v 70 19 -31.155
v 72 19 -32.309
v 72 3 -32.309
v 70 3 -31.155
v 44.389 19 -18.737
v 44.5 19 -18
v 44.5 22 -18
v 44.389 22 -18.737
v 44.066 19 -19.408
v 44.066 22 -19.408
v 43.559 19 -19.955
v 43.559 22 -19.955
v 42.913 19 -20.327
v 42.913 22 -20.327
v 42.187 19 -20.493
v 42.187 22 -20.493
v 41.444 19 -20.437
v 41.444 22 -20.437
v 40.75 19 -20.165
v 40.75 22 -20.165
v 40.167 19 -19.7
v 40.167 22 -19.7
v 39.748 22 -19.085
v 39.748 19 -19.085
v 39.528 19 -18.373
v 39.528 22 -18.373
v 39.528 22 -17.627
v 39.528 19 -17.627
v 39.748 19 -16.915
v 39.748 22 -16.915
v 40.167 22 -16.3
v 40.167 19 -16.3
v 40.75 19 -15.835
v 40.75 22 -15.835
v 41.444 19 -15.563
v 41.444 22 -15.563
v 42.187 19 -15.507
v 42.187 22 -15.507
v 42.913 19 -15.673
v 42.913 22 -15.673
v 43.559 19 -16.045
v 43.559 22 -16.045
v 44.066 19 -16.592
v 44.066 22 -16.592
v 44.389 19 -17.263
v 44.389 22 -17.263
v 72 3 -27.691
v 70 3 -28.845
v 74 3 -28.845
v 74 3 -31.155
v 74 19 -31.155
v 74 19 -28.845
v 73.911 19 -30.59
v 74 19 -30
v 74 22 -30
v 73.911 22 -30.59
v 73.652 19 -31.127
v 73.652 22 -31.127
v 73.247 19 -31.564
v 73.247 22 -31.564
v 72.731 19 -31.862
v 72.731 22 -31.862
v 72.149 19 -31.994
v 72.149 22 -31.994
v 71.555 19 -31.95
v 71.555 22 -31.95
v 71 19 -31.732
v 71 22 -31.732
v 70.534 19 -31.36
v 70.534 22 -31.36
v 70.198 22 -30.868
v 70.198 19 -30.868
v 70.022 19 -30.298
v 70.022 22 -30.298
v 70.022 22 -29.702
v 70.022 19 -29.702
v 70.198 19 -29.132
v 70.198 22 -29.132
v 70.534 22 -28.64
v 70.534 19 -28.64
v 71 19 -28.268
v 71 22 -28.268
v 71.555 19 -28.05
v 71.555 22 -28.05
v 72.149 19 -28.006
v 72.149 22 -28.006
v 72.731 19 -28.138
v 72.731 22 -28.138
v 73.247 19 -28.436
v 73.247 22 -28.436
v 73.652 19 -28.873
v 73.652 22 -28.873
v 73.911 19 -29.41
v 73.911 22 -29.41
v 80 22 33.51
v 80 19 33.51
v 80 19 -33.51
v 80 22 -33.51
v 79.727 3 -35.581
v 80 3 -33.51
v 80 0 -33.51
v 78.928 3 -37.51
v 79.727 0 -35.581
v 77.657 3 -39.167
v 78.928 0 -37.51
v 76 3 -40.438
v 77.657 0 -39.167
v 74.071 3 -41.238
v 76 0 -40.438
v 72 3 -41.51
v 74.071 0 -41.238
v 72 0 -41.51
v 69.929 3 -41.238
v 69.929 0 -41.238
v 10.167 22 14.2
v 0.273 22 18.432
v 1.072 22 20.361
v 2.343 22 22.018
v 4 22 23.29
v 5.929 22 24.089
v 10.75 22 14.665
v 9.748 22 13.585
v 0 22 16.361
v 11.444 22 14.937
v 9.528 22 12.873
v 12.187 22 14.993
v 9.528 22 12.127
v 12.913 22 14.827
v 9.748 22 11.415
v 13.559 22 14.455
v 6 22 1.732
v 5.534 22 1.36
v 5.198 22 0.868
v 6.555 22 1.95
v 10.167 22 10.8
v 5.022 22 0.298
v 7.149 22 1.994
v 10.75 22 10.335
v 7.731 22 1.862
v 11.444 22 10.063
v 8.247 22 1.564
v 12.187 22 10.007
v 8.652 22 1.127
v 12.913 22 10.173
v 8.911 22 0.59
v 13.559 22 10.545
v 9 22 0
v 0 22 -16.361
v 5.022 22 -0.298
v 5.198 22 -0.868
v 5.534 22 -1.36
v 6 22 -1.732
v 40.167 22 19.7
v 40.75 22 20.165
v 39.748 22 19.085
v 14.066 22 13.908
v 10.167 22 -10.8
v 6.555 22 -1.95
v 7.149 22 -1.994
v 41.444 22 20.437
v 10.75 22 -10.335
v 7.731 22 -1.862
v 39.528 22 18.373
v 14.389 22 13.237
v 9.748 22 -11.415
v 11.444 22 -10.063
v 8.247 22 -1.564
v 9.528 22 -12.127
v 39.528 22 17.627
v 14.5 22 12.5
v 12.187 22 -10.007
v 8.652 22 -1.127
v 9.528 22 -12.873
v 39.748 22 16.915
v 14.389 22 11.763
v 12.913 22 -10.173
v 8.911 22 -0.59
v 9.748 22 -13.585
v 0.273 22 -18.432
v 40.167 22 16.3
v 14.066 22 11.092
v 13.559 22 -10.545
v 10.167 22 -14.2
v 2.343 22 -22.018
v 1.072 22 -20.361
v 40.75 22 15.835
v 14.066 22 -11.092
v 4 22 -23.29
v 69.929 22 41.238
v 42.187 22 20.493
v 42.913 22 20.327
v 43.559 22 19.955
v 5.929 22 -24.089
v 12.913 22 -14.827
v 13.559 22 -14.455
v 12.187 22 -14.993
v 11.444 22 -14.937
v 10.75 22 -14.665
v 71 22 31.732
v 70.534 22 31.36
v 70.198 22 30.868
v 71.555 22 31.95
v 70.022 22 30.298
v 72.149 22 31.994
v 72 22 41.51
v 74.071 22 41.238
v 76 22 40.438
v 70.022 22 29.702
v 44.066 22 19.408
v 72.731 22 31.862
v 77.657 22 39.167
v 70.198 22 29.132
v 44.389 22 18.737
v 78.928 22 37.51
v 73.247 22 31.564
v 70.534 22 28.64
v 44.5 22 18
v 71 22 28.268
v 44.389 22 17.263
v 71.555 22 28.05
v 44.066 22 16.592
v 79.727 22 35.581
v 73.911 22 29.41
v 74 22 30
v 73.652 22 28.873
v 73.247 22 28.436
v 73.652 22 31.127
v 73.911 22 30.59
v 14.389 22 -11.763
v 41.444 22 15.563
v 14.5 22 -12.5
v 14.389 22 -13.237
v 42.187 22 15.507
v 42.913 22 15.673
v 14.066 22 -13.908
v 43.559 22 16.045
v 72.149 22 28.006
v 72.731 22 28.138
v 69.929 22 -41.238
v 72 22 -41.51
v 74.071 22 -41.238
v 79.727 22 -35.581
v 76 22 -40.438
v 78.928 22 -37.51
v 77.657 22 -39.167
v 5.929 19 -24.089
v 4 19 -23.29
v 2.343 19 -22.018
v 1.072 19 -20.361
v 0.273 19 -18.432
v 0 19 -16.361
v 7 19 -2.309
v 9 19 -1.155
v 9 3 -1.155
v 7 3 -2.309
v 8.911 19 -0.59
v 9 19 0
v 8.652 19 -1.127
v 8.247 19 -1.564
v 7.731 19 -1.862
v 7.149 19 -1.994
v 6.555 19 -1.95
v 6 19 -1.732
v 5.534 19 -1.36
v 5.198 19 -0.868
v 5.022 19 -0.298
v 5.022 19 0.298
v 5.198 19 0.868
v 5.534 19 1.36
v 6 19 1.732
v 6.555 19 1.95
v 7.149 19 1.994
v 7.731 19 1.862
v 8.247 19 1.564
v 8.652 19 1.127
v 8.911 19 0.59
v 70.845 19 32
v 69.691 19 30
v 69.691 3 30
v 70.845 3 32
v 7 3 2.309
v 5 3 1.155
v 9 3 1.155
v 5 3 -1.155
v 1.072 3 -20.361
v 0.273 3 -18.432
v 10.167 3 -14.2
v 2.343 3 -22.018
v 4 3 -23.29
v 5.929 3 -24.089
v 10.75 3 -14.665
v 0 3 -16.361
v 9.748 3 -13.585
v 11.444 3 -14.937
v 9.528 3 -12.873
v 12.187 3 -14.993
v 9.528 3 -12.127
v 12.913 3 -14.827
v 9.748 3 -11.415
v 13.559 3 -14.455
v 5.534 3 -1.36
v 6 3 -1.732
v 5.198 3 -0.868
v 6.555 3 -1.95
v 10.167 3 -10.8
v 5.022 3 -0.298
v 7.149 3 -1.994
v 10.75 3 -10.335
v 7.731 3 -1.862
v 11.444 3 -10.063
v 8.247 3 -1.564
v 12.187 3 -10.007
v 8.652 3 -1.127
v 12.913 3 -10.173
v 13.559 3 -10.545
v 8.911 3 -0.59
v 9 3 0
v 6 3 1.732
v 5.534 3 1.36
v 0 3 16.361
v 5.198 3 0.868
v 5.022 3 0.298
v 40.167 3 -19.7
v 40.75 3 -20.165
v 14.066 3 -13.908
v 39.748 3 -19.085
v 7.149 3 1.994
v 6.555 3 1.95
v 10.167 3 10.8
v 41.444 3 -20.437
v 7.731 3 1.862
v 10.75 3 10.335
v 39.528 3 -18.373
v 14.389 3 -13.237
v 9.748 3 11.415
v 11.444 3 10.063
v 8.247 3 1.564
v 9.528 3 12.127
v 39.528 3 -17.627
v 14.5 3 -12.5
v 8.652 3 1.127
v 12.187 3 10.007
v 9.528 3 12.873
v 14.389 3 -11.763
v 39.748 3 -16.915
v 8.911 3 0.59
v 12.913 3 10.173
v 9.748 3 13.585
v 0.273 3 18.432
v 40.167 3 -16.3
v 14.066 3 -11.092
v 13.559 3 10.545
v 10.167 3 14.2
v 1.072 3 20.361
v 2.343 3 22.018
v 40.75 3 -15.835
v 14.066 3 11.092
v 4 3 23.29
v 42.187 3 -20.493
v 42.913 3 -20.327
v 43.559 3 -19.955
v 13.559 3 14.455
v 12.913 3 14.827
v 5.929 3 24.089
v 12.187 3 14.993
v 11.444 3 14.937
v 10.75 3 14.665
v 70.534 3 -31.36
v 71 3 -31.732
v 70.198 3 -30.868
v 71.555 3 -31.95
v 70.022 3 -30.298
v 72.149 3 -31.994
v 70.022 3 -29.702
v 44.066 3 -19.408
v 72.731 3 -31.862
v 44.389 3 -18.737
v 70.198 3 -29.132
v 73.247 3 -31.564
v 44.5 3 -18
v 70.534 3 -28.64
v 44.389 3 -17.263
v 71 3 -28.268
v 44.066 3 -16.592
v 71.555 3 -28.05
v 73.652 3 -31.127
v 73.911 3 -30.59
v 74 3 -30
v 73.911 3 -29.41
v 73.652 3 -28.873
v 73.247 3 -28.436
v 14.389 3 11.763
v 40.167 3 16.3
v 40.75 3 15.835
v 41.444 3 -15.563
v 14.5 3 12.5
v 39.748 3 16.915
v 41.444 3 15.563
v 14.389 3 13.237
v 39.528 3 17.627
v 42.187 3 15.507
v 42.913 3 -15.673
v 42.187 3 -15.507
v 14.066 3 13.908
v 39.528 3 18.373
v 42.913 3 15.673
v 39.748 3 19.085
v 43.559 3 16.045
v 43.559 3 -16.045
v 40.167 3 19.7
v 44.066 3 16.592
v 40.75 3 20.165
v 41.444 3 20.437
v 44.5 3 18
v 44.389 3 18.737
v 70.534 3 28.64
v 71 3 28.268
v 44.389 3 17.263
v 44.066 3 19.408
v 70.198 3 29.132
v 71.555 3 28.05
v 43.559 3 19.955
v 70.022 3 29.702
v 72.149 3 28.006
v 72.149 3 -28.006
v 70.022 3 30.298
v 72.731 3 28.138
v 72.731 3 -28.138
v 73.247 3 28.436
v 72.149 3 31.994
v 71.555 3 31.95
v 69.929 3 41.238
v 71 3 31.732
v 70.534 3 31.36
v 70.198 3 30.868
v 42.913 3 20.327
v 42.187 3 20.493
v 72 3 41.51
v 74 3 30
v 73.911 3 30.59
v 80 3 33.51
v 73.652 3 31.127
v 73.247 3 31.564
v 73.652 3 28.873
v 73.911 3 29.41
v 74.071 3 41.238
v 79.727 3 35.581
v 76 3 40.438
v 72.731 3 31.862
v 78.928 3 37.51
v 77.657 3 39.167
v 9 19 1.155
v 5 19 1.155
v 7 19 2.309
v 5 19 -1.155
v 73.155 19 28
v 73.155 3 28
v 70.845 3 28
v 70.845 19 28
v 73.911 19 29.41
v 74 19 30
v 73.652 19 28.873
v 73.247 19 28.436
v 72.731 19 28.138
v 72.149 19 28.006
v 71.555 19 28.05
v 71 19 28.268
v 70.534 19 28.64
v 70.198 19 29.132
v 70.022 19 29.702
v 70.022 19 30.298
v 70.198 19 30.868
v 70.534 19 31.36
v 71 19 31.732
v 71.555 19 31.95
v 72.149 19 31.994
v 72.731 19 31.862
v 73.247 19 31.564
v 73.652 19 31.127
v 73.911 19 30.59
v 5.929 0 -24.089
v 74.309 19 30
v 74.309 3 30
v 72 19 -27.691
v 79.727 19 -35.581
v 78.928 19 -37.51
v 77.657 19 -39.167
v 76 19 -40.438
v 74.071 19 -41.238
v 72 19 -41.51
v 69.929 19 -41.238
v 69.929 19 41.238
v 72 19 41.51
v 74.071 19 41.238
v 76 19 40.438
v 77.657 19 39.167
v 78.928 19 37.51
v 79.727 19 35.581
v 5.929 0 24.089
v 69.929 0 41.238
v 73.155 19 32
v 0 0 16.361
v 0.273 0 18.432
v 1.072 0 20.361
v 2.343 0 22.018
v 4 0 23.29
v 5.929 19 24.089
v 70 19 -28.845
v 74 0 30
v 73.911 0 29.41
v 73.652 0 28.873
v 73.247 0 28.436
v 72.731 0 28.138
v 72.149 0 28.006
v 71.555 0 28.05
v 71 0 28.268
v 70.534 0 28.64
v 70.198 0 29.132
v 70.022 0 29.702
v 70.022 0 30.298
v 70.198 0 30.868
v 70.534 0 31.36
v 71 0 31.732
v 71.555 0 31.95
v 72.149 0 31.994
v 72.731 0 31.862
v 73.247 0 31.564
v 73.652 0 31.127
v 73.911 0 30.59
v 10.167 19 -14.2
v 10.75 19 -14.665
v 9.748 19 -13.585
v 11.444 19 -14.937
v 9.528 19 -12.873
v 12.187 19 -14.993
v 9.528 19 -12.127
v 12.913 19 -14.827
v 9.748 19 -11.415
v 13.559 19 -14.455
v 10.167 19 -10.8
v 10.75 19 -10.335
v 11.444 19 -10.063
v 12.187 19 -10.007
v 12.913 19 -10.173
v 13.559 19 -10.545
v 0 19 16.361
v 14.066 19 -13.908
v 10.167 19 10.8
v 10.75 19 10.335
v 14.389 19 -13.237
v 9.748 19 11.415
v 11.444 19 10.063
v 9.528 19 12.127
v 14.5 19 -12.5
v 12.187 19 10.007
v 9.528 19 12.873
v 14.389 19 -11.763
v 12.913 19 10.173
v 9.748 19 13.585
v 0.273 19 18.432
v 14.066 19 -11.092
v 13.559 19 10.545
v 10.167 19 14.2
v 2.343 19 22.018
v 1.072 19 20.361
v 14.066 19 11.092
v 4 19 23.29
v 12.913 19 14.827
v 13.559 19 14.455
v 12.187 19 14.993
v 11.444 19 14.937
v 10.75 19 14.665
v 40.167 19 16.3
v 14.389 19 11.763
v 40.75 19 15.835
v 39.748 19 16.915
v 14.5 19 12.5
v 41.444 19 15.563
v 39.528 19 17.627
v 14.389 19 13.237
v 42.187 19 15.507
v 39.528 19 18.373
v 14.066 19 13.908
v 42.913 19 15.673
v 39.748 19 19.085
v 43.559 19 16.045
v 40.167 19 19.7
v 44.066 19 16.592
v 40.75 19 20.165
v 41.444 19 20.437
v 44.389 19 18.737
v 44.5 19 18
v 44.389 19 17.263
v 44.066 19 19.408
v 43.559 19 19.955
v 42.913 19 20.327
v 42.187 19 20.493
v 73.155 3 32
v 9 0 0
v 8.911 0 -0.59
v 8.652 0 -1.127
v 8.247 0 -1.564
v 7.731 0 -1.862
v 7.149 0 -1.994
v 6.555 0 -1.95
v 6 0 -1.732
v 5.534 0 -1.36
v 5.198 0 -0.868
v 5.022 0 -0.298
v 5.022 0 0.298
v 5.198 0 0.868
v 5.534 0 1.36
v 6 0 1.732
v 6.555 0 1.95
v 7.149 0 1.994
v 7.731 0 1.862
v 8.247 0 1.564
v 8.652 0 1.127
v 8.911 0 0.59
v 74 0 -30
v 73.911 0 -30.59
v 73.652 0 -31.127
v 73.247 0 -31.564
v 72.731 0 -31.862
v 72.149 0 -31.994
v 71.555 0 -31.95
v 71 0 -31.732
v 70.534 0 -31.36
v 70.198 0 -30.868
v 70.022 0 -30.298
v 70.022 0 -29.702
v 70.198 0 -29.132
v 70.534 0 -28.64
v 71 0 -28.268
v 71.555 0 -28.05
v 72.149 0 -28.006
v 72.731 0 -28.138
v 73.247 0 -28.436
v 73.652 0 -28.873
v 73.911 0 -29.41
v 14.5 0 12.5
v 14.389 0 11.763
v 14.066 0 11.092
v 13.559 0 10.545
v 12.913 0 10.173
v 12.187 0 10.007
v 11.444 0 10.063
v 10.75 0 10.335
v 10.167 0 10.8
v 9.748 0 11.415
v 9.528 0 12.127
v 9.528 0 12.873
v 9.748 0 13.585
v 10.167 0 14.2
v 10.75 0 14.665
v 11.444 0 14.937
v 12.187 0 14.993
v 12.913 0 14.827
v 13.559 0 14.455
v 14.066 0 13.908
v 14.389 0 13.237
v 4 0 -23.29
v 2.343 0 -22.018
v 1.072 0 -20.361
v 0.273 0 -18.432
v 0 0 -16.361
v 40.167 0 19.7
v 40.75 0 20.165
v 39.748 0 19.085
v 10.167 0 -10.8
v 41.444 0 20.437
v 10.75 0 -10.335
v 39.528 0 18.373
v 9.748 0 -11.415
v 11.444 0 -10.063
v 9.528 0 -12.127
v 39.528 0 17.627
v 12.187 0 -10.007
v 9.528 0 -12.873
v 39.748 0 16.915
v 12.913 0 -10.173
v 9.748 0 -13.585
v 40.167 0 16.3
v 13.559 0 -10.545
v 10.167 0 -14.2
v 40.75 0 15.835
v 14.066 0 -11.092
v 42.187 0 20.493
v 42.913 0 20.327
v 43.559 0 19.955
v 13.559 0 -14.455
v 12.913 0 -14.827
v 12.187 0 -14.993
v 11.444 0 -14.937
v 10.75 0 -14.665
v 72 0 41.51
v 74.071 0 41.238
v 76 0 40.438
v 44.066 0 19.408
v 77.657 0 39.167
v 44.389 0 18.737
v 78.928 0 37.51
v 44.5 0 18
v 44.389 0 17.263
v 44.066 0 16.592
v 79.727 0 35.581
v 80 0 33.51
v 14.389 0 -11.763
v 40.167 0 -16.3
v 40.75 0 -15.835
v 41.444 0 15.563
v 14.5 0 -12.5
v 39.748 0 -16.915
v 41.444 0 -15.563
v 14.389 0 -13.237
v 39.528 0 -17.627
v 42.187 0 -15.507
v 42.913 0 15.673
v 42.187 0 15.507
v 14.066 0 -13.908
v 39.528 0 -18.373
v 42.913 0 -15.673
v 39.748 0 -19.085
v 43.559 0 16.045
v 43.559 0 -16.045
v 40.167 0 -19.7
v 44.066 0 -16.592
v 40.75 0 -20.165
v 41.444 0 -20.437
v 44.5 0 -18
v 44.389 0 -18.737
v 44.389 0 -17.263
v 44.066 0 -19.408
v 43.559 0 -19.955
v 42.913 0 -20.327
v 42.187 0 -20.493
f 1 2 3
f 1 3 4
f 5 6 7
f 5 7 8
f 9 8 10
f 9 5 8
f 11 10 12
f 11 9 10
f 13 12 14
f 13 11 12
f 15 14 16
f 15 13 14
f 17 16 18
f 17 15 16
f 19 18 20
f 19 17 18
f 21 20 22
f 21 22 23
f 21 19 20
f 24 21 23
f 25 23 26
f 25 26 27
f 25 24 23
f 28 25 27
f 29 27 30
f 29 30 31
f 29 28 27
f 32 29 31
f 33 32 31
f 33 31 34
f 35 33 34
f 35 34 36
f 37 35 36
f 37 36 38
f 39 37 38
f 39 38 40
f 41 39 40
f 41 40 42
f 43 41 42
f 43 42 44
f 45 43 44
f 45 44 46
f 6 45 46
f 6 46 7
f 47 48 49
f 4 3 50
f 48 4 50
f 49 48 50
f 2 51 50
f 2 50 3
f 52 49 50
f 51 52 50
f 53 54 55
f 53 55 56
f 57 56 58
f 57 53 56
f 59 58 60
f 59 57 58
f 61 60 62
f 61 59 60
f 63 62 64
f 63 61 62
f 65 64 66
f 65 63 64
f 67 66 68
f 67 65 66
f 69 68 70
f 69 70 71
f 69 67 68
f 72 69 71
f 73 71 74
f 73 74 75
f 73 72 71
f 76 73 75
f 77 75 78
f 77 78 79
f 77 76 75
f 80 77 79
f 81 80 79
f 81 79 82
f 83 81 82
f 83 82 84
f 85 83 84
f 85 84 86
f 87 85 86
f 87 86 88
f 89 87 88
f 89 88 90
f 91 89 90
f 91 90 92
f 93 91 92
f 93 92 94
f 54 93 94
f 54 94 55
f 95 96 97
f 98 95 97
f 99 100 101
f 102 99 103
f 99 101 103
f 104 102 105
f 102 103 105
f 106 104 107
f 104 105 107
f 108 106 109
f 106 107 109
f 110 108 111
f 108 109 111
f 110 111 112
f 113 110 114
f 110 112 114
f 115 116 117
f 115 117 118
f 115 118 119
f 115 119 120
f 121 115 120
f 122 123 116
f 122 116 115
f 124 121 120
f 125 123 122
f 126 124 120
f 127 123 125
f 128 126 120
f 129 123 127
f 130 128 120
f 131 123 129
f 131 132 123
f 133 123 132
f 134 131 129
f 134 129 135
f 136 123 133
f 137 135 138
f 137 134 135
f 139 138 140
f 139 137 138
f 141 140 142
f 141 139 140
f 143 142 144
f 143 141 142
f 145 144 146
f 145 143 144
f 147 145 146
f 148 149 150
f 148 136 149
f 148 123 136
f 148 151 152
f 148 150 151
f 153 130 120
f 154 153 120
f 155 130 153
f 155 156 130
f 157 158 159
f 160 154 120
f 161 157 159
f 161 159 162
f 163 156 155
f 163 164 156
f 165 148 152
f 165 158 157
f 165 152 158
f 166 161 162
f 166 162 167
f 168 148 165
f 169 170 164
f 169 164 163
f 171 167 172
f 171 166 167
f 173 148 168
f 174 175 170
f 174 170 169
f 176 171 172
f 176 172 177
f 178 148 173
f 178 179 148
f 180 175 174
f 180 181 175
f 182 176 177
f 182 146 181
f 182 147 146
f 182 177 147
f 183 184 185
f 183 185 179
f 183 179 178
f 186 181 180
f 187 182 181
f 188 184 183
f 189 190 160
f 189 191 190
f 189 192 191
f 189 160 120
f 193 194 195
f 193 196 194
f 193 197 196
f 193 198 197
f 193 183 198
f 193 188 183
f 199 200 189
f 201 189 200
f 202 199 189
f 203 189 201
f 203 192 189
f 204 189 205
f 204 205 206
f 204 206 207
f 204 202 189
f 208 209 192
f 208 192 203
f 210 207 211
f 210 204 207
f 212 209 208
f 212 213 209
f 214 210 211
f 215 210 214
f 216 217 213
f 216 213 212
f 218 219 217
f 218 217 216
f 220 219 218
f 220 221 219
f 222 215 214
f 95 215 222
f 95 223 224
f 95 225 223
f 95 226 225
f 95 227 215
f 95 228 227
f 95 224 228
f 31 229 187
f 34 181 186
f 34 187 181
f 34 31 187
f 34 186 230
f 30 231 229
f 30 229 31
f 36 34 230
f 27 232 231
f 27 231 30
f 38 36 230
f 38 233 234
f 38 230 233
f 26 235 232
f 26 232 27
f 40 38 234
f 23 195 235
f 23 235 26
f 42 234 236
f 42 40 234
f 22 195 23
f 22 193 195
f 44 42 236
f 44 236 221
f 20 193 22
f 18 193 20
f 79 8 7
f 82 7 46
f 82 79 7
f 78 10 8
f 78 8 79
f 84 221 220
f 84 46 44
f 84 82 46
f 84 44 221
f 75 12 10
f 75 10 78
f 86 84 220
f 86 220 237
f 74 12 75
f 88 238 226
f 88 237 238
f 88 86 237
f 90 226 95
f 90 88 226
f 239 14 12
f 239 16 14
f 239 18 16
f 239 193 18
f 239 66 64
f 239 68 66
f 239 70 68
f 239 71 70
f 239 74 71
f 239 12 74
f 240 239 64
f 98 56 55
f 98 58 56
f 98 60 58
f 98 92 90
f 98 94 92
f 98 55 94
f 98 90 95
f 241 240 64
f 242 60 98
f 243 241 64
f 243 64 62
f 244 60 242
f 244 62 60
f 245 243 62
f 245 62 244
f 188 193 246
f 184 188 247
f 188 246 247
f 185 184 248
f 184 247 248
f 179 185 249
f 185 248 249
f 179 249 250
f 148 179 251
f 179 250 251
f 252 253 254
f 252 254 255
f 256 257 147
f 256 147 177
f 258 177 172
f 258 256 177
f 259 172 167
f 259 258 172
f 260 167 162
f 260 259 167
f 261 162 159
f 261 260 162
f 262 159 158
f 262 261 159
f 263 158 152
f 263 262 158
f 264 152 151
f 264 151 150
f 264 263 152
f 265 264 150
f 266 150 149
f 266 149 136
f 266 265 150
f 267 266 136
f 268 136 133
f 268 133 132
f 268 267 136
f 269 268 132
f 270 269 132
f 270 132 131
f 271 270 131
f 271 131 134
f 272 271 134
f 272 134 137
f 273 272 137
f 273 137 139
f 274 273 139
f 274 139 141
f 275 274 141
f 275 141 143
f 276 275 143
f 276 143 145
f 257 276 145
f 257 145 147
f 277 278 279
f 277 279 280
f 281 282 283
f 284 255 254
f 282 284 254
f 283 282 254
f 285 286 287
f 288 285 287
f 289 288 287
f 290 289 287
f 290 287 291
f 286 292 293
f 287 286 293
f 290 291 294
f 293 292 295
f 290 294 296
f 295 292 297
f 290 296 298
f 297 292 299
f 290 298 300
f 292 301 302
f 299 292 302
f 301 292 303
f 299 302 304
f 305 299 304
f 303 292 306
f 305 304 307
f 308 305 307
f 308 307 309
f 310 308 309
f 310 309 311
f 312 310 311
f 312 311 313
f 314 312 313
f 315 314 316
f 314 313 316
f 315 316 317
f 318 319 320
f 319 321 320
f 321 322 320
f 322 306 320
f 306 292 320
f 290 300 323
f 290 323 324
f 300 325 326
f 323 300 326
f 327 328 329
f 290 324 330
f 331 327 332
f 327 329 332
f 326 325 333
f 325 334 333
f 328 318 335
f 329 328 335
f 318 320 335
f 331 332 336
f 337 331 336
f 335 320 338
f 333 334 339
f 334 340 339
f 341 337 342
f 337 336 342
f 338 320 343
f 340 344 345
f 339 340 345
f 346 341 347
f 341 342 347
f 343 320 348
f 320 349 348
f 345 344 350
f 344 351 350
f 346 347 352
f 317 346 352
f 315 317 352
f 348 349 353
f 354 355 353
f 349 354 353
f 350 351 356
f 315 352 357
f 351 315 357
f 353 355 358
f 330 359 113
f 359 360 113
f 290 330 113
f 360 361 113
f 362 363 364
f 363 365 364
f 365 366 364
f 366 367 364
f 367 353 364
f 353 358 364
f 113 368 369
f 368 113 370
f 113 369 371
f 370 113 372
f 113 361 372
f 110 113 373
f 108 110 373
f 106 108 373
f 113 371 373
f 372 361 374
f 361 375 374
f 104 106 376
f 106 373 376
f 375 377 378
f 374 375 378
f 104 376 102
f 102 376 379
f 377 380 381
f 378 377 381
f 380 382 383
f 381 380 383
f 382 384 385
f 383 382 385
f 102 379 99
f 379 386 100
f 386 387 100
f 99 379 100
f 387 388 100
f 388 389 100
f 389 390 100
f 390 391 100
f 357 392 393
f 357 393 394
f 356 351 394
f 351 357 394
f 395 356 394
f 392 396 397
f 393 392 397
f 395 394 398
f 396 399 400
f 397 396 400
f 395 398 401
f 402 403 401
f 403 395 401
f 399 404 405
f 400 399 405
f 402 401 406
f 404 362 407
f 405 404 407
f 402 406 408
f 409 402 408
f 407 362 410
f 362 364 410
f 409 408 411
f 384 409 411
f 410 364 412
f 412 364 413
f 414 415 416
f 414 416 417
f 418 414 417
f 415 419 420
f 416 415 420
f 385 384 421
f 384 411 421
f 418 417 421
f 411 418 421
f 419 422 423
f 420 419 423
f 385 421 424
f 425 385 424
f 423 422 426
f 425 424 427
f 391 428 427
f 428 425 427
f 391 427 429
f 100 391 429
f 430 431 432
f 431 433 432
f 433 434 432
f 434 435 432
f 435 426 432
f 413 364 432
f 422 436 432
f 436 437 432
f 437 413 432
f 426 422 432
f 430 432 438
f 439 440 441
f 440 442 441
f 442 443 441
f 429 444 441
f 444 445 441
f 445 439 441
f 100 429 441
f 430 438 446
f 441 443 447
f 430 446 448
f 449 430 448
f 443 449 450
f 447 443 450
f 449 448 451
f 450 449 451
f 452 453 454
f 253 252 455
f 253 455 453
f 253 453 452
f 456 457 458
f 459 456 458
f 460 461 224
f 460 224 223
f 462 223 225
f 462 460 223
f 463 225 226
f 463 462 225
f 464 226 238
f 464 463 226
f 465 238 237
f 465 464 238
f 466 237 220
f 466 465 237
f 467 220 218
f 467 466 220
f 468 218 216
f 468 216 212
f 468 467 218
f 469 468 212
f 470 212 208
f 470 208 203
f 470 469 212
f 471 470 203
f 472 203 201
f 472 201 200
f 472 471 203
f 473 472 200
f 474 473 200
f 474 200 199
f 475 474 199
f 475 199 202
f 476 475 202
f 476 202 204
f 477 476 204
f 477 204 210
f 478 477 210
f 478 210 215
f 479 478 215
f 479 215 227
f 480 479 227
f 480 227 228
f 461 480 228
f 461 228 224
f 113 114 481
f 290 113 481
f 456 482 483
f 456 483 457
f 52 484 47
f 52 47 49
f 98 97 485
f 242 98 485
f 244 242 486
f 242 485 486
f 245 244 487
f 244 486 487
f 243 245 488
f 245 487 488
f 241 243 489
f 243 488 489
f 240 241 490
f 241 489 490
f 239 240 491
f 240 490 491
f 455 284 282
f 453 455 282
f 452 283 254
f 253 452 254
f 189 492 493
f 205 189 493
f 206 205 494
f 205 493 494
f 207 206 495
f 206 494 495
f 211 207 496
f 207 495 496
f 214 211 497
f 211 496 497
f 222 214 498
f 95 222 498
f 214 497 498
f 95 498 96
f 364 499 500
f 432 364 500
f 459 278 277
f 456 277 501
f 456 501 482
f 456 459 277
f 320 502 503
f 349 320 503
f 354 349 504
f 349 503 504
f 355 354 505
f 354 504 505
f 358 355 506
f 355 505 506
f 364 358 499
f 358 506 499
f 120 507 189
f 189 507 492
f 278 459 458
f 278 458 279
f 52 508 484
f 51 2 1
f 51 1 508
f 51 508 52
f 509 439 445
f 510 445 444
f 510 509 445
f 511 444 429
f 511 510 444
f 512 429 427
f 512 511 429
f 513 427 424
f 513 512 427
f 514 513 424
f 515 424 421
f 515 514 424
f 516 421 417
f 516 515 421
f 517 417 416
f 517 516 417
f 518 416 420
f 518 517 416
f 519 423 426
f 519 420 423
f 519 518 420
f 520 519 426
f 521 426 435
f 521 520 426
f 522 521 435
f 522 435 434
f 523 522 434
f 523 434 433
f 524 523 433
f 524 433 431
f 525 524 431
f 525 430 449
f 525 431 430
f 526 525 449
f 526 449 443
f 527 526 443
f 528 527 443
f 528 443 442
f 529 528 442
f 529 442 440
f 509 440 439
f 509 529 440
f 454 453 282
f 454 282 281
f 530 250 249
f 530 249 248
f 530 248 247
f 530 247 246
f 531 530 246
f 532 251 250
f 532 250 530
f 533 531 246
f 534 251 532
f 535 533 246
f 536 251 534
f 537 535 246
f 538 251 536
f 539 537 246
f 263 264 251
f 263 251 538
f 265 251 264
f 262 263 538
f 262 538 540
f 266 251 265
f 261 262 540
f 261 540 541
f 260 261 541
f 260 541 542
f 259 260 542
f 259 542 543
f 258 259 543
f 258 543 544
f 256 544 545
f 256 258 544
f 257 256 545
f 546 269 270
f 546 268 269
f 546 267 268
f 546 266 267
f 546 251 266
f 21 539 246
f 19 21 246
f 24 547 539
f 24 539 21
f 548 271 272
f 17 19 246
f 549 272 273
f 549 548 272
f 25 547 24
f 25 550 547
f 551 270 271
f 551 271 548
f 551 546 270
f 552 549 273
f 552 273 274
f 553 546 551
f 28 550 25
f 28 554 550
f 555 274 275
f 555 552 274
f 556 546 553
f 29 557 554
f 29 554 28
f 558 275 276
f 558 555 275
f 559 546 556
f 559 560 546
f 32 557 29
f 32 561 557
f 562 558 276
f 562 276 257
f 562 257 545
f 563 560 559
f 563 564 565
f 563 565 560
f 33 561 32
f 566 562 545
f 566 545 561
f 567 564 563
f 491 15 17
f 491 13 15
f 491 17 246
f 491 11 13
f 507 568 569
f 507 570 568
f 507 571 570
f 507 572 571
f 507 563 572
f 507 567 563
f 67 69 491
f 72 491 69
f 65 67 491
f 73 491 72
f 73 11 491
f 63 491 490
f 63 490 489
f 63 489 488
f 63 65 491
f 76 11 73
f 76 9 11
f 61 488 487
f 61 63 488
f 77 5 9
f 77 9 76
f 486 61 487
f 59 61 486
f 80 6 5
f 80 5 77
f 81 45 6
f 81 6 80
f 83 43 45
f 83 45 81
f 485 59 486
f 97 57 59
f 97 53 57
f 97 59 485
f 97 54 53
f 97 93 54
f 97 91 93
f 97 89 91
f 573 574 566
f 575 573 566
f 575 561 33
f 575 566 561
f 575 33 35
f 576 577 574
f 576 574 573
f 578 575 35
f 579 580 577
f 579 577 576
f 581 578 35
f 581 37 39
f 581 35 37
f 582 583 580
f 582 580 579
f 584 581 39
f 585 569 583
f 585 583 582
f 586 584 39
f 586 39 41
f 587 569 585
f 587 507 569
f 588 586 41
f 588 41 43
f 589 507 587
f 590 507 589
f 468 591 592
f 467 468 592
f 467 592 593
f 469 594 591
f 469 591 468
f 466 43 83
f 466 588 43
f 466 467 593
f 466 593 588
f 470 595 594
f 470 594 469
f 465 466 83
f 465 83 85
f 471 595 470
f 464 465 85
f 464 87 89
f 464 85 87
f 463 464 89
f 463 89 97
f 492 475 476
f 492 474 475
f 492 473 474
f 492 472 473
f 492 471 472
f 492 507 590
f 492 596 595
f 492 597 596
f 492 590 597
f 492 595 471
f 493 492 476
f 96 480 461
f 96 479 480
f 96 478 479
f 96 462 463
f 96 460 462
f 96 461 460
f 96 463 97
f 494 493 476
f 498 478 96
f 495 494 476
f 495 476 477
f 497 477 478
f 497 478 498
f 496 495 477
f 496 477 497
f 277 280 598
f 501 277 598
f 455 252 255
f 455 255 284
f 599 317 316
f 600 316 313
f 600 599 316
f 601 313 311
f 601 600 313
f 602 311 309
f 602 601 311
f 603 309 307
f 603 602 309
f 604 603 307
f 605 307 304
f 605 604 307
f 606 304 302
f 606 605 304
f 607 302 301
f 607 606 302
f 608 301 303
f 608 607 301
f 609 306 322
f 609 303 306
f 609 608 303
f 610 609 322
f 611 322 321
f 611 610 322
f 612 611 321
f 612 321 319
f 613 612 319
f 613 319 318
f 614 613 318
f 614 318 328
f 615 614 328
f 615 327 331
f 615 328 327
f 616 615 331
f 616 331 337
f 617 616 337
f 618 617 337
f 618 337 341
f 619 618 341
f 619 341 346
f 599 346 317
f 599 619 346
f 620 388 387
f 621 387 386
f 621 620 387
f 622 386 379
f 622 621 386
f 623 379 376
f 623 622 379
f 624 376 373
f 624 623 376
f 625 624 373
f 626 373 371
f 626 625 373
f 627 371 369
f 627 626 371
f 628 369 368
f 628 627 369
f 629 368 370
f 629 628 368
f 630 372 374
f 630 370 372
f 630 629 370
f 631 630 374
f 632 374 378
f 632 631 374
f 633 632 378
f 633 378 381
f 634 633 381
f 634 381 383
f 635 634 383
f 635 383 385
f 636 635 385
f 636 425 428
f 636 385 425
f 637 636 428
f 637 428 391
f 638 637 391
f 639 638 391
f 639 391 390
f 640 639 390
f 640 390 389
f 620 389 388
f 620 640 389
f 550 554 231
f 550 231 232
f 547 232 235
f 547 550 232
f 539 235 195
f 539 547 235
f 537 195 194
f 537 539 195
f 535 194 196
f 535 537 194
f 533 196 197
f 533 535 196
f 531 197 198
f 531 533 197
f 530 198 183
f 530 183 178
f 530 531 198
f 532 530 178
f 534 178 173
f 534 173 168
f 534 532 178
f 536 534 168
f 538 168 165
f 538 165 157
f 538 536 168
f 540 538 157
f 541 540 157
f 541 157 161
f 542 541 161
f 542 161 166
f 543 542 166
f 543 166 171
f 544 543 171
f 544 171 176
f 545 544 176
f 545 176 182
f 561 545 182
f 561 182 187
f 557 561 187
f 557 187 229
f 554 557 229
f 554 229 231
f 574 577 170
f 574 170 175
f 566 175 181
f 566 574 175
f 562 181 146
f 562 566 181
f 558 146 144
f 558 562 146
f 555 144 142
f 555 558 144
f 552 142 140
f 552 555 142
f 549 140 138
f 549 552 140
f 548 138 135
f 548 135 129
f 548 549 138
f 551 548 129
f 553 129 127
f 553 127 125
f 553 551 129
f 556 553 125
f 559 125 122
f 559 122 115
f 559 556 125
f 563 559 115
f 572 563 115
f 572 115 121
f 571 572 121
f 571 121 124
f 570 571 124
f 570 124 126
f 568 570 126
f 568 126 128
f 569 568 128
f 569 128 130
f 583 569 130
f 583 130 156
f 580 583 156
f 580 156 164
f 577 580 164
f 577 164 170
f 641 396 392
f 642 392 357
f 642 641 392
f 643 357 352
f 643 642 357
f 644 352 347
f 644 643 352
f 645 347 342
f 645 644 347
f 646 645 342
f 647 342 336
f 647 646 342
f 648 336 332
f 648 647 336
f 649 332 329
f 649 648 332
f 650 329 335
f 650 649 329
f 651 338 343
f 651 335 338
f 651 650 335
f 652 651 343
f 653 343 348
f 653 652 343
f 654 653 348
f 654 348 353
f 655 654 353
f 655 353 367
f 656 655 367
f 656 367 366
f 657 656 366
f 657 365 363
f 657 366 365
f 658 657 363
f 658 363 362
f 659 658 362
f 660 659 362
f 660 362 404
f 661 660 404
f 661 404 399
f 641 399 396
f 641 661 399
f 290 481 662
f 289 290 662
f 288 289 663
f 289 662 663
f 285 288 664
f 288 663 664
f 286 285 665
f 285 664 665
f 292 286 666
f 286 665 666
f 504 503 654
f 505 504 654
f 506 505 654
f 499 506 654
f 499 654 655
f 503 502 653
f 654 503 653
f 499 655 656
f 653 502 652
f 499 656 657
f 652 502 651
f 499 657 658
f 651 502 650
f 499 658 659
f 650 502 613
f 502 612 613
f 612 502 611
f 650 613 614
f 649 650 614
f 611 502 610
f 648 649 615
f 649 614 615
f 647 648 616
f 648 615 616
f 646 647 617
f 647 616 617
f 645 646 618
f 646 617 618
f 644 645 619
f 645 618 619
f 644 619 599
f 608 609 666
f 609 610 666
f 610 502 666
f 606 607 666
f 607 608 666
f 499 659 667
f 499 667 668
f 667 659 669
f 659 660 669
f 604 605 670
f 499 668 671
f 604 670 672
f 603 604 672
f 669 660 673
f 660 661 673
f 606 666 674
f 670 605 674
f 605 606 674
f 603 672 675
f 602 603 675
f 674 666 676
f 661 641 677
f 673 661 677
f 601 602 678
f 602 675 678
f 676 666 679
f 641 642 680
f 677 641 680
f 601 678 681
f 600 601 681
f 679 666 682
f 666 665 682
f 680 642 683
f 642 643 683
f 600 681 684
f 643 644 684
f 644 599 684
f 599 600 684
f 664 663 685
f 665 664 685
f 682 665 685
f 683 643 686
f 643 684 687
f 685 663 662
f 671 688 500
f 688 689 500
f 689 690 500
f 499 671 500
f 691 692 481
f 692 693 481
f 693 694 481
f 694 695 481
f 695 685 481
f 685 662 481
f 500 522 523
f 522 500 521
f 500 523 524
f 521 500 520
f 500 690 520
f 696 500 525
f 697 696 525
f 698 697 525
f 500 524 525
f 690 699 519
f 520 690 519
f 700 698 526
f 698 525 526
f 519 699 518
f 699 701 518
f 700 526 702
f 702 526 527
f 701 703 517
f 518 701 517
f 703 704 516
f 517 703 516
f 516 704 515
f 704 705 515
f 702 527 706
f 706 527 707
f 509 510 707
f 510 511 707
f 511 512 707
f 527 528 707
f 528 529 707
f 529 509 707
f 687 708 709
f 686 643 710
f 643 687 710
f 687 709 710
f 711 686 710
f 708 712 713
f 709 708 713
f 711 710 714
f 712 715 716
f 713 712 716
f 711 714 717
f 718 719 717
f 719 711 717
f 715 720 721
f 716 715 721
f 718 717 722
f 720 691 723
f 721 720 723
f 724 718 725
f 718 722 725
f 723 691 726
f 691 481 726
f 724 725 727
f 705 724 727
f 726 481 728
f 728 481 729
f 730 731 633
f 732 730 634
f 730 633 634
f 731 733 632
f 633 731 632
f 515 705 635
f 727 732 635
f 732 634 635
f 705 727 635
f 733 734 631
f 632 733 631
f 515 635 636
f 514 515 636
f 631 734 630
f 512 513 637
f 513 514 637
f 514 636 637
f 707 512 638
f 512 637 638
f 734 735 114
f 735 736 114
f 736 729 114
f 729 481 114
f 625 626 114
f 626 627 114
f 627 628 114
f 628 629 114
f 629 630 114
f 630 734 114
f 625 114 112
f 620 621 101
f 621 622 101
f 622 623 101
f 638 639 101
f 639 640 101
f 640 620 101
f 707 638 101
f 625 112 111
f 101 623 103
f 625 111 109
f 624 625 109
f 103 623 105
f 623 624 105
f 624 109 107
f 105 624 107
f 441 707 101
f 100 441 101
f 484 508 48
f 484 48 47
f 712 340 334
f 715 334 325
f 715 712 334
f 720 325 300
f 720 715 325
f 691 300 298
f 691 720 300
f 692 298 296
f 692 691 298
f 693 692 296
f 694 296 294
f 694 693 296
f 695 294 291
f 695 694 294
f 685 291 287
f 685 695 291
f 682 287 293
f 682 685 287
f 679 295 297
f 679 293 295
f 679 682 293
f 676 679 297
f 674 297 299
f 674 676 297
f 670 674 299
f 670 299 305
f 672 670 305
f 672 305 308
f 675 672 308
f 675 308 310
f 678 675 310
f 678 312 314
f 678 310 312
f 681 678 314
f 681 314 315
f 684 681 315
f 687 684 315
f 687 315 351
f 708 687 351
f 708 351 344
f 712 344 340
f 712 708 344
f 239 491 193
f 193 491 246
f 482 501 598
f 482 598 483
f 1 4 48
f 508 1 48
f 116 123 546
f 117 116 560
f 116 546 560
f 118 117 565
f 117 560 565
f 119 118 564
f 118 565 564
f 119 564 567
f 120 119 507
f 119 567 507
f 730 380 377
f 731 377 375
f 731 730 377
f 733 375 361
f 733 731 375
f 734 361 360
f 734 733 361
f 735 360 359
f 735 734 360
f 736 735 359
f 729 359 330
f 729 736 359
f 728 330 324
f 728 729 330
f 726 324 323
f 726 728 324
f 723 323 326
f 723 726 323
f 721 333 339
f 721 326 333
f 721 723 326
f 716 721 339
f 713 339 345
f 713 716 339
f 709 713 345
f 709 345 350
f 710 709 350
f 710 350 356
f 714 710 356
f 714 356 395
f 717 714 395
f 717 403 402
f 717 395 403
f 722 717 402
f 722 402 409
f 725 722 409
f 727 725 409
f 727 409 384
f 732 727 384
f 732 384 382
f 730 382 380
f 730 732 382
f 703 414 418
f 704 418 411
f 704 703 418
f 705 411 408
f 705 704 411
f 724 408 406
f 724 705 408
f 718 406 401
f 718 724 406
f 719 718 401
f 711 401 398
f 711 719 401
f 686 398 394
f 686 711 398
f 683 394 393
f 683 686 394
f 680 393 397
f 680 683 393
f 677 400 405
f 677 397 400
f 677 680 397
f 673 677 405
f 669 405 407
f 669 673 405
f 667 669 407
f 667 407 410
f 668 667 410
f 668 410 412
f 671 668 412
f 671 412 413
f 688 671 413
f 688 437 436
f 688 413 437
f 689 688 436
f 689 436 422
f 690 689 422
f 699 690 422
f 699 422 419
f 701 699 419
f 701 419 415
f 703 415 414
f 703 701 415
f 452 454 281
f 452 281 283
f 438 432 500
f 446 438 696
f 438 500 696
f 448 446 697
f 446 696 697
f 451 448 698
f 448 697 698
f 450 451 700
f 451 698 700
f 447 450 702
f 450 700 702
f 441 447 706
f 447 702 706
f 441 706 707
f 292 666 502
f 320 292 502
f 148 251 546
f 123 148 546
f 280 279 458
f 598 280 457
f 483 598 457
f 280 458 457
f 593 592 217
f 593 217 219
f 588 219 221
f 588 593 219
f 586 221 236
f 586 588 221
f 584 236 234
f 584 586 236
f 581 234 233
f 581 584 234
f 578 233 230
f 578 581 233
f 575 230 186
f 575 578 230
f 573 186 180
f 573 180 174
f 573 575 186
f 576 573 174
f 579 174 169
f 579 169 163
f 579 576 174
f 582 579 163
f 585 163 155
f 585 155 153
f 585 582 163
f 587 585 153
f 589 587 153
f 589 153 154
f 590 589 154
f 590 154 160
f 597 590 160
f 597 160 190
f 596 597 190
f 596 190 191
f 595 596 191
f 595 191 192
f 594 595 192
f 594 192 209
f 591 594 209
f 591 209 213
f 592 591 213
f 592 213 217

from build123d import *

# Parameters (mm, degrees)
CROQUIS1_R                = 2.5
CROQUIS1_R_2              = 2
SALIENTE_EXTRUIR1_DEPTH   = 22
CROQUIS2_W                = 80
CROQUIS2_H                = 16
CORTAR_EXTRUIR1_DEPTH     = 50
SALIENTE_EXTRUIR2_DEPTH   = 16
SALIENTE_EXTRUIR2_2_DEPTH = 16
SALIENTE_EXTRUIR2_3_DEPTH = 16


with BuildPart() as part:
    # Croquis1 → Saliente-Extruir1 (new body)
    with BuildSketch(Plane(origin=(0, 0, 0), x_dir=(1, 0, 0), z_dir=(0, 1, 0))):
        with BuildLine():
            Line((0, 16.361384096), (0, -16.361384096))
            ThreePointArc((0, -16.361384096), (1.653173278, -21.231475528), (5.929447639, -24.088790706))
            Line((5.929447639, -24.088790706), (69.929447639, -41.237539022))
            ThreePointArc((69.929447639, -41.237539022), (76.870091432, -39.856959134), (80, -33.510132412))
            Line((80, -33.510132412), (80, 33.510132412))
            ThreePointArc((80, 33.510132412), (76.870091432, 39.856959134), (69.929447639, 41.237539022))
            Line((69.929447639, 41.237539022), (5.929447639, 24.088790706))
            ThreePointArc((5.929447639, 24.088790706), (1.653173278, 21.231475528), (0, 16.361384096))
        make_face()
        with Locations((12, 12.5)):
            Circle(CROQUIS1_R, mode=Mode.SUBTRACT)
        with Locations((12, -12.5)):
            Circle(CROQUIS1_R, mode=Mode.SUBTRACT)
        with Locations((42, 18)):
            Circle(CROQUIS1_R, mode=Mode.SUBTRACT)
        with Locations((42, -18)):
            Circle(CROQUIS1_R, mode=Mode.SUBTRACT)
        with Locations((7, 0)):
            Circle(CROQUIS1_R_2, mode=Mode.SUBTRACT)
        with Locations((72, -30)):
            Circle(CROQUIS1_R_2, mode=Mode.SUBTRACT)
        with Locations((72, 30)):
            Circle(CROQUIS1_R_2, mode=Mode.SUBTRACT)
    extrude(amount=SALIENTE_EXTRUIR1_DEPTH)

    # Croquis2 → Cortar-Extruir1 (cut, symmetric)
    with BuildSketch(Plane.XY):
        with Locations((40, 11)):
            Rectangle(CROQUIS2_W, CROQUIS2_H)
    extrude(amount=CORTAR_EXTRUIR1_DEPTH, both=True, mode=Mode.SUBTRACT)


with BuildPart() as body_2:
    # Croquis3 → Saliente-Extruir2 (new body)
    with BuildSketch(Plane(origin=(0, 3, 0), x_dir=(1, 0, 0), z_dir=(0, 1, 0))):
        Polygon((7, -2.309401077), (9, -1.154700538), (9, 1.154700538), (7, 2.309401077), (5, 1.154700538), (5, -1.154700538), align=None)
    extrude(amount=SALIENTE_EXTRUIR2_DEPTH)


with BuildPart() as body_3:
    # Croquis3 → Saliente-Extruir2 2 (new body)
    with BuildSketch(Plane(origin=(0, 3, 0), x_dir=(1, 0, 0), z_dir=(0, 1, 0))):
        Polygon((70.845299462, -32), (73.154700538, -32), (74.309401077, -30), (73.154700538, -28), (70.845299462, -28), (69.690598923, -30), align=None)
    extrude(amount=SALIENTE_EXTRUIR2_2_DEPTH)


with BuildPart() as body_4:
    # Croquis3 → Saliente-Extruir2 3 (new body)
    with BuildSketch(Plane(origin=(0, 3, 0), x_dir=(1, 0, 0), z_dir=(0, 1, 0))):
        Polygon((74, 28.845299462), (74, 31.154700538), (72, 32.309401077), (70, 31.154700538), (70, 28.845299462), (72, 27.690598923), align=None)
    extrude(amount=SALIENTE_EXTRUIR2_3_DEPTH)


solid = Compound([part.part, body_2.part, body_3.part, body_4.part])
